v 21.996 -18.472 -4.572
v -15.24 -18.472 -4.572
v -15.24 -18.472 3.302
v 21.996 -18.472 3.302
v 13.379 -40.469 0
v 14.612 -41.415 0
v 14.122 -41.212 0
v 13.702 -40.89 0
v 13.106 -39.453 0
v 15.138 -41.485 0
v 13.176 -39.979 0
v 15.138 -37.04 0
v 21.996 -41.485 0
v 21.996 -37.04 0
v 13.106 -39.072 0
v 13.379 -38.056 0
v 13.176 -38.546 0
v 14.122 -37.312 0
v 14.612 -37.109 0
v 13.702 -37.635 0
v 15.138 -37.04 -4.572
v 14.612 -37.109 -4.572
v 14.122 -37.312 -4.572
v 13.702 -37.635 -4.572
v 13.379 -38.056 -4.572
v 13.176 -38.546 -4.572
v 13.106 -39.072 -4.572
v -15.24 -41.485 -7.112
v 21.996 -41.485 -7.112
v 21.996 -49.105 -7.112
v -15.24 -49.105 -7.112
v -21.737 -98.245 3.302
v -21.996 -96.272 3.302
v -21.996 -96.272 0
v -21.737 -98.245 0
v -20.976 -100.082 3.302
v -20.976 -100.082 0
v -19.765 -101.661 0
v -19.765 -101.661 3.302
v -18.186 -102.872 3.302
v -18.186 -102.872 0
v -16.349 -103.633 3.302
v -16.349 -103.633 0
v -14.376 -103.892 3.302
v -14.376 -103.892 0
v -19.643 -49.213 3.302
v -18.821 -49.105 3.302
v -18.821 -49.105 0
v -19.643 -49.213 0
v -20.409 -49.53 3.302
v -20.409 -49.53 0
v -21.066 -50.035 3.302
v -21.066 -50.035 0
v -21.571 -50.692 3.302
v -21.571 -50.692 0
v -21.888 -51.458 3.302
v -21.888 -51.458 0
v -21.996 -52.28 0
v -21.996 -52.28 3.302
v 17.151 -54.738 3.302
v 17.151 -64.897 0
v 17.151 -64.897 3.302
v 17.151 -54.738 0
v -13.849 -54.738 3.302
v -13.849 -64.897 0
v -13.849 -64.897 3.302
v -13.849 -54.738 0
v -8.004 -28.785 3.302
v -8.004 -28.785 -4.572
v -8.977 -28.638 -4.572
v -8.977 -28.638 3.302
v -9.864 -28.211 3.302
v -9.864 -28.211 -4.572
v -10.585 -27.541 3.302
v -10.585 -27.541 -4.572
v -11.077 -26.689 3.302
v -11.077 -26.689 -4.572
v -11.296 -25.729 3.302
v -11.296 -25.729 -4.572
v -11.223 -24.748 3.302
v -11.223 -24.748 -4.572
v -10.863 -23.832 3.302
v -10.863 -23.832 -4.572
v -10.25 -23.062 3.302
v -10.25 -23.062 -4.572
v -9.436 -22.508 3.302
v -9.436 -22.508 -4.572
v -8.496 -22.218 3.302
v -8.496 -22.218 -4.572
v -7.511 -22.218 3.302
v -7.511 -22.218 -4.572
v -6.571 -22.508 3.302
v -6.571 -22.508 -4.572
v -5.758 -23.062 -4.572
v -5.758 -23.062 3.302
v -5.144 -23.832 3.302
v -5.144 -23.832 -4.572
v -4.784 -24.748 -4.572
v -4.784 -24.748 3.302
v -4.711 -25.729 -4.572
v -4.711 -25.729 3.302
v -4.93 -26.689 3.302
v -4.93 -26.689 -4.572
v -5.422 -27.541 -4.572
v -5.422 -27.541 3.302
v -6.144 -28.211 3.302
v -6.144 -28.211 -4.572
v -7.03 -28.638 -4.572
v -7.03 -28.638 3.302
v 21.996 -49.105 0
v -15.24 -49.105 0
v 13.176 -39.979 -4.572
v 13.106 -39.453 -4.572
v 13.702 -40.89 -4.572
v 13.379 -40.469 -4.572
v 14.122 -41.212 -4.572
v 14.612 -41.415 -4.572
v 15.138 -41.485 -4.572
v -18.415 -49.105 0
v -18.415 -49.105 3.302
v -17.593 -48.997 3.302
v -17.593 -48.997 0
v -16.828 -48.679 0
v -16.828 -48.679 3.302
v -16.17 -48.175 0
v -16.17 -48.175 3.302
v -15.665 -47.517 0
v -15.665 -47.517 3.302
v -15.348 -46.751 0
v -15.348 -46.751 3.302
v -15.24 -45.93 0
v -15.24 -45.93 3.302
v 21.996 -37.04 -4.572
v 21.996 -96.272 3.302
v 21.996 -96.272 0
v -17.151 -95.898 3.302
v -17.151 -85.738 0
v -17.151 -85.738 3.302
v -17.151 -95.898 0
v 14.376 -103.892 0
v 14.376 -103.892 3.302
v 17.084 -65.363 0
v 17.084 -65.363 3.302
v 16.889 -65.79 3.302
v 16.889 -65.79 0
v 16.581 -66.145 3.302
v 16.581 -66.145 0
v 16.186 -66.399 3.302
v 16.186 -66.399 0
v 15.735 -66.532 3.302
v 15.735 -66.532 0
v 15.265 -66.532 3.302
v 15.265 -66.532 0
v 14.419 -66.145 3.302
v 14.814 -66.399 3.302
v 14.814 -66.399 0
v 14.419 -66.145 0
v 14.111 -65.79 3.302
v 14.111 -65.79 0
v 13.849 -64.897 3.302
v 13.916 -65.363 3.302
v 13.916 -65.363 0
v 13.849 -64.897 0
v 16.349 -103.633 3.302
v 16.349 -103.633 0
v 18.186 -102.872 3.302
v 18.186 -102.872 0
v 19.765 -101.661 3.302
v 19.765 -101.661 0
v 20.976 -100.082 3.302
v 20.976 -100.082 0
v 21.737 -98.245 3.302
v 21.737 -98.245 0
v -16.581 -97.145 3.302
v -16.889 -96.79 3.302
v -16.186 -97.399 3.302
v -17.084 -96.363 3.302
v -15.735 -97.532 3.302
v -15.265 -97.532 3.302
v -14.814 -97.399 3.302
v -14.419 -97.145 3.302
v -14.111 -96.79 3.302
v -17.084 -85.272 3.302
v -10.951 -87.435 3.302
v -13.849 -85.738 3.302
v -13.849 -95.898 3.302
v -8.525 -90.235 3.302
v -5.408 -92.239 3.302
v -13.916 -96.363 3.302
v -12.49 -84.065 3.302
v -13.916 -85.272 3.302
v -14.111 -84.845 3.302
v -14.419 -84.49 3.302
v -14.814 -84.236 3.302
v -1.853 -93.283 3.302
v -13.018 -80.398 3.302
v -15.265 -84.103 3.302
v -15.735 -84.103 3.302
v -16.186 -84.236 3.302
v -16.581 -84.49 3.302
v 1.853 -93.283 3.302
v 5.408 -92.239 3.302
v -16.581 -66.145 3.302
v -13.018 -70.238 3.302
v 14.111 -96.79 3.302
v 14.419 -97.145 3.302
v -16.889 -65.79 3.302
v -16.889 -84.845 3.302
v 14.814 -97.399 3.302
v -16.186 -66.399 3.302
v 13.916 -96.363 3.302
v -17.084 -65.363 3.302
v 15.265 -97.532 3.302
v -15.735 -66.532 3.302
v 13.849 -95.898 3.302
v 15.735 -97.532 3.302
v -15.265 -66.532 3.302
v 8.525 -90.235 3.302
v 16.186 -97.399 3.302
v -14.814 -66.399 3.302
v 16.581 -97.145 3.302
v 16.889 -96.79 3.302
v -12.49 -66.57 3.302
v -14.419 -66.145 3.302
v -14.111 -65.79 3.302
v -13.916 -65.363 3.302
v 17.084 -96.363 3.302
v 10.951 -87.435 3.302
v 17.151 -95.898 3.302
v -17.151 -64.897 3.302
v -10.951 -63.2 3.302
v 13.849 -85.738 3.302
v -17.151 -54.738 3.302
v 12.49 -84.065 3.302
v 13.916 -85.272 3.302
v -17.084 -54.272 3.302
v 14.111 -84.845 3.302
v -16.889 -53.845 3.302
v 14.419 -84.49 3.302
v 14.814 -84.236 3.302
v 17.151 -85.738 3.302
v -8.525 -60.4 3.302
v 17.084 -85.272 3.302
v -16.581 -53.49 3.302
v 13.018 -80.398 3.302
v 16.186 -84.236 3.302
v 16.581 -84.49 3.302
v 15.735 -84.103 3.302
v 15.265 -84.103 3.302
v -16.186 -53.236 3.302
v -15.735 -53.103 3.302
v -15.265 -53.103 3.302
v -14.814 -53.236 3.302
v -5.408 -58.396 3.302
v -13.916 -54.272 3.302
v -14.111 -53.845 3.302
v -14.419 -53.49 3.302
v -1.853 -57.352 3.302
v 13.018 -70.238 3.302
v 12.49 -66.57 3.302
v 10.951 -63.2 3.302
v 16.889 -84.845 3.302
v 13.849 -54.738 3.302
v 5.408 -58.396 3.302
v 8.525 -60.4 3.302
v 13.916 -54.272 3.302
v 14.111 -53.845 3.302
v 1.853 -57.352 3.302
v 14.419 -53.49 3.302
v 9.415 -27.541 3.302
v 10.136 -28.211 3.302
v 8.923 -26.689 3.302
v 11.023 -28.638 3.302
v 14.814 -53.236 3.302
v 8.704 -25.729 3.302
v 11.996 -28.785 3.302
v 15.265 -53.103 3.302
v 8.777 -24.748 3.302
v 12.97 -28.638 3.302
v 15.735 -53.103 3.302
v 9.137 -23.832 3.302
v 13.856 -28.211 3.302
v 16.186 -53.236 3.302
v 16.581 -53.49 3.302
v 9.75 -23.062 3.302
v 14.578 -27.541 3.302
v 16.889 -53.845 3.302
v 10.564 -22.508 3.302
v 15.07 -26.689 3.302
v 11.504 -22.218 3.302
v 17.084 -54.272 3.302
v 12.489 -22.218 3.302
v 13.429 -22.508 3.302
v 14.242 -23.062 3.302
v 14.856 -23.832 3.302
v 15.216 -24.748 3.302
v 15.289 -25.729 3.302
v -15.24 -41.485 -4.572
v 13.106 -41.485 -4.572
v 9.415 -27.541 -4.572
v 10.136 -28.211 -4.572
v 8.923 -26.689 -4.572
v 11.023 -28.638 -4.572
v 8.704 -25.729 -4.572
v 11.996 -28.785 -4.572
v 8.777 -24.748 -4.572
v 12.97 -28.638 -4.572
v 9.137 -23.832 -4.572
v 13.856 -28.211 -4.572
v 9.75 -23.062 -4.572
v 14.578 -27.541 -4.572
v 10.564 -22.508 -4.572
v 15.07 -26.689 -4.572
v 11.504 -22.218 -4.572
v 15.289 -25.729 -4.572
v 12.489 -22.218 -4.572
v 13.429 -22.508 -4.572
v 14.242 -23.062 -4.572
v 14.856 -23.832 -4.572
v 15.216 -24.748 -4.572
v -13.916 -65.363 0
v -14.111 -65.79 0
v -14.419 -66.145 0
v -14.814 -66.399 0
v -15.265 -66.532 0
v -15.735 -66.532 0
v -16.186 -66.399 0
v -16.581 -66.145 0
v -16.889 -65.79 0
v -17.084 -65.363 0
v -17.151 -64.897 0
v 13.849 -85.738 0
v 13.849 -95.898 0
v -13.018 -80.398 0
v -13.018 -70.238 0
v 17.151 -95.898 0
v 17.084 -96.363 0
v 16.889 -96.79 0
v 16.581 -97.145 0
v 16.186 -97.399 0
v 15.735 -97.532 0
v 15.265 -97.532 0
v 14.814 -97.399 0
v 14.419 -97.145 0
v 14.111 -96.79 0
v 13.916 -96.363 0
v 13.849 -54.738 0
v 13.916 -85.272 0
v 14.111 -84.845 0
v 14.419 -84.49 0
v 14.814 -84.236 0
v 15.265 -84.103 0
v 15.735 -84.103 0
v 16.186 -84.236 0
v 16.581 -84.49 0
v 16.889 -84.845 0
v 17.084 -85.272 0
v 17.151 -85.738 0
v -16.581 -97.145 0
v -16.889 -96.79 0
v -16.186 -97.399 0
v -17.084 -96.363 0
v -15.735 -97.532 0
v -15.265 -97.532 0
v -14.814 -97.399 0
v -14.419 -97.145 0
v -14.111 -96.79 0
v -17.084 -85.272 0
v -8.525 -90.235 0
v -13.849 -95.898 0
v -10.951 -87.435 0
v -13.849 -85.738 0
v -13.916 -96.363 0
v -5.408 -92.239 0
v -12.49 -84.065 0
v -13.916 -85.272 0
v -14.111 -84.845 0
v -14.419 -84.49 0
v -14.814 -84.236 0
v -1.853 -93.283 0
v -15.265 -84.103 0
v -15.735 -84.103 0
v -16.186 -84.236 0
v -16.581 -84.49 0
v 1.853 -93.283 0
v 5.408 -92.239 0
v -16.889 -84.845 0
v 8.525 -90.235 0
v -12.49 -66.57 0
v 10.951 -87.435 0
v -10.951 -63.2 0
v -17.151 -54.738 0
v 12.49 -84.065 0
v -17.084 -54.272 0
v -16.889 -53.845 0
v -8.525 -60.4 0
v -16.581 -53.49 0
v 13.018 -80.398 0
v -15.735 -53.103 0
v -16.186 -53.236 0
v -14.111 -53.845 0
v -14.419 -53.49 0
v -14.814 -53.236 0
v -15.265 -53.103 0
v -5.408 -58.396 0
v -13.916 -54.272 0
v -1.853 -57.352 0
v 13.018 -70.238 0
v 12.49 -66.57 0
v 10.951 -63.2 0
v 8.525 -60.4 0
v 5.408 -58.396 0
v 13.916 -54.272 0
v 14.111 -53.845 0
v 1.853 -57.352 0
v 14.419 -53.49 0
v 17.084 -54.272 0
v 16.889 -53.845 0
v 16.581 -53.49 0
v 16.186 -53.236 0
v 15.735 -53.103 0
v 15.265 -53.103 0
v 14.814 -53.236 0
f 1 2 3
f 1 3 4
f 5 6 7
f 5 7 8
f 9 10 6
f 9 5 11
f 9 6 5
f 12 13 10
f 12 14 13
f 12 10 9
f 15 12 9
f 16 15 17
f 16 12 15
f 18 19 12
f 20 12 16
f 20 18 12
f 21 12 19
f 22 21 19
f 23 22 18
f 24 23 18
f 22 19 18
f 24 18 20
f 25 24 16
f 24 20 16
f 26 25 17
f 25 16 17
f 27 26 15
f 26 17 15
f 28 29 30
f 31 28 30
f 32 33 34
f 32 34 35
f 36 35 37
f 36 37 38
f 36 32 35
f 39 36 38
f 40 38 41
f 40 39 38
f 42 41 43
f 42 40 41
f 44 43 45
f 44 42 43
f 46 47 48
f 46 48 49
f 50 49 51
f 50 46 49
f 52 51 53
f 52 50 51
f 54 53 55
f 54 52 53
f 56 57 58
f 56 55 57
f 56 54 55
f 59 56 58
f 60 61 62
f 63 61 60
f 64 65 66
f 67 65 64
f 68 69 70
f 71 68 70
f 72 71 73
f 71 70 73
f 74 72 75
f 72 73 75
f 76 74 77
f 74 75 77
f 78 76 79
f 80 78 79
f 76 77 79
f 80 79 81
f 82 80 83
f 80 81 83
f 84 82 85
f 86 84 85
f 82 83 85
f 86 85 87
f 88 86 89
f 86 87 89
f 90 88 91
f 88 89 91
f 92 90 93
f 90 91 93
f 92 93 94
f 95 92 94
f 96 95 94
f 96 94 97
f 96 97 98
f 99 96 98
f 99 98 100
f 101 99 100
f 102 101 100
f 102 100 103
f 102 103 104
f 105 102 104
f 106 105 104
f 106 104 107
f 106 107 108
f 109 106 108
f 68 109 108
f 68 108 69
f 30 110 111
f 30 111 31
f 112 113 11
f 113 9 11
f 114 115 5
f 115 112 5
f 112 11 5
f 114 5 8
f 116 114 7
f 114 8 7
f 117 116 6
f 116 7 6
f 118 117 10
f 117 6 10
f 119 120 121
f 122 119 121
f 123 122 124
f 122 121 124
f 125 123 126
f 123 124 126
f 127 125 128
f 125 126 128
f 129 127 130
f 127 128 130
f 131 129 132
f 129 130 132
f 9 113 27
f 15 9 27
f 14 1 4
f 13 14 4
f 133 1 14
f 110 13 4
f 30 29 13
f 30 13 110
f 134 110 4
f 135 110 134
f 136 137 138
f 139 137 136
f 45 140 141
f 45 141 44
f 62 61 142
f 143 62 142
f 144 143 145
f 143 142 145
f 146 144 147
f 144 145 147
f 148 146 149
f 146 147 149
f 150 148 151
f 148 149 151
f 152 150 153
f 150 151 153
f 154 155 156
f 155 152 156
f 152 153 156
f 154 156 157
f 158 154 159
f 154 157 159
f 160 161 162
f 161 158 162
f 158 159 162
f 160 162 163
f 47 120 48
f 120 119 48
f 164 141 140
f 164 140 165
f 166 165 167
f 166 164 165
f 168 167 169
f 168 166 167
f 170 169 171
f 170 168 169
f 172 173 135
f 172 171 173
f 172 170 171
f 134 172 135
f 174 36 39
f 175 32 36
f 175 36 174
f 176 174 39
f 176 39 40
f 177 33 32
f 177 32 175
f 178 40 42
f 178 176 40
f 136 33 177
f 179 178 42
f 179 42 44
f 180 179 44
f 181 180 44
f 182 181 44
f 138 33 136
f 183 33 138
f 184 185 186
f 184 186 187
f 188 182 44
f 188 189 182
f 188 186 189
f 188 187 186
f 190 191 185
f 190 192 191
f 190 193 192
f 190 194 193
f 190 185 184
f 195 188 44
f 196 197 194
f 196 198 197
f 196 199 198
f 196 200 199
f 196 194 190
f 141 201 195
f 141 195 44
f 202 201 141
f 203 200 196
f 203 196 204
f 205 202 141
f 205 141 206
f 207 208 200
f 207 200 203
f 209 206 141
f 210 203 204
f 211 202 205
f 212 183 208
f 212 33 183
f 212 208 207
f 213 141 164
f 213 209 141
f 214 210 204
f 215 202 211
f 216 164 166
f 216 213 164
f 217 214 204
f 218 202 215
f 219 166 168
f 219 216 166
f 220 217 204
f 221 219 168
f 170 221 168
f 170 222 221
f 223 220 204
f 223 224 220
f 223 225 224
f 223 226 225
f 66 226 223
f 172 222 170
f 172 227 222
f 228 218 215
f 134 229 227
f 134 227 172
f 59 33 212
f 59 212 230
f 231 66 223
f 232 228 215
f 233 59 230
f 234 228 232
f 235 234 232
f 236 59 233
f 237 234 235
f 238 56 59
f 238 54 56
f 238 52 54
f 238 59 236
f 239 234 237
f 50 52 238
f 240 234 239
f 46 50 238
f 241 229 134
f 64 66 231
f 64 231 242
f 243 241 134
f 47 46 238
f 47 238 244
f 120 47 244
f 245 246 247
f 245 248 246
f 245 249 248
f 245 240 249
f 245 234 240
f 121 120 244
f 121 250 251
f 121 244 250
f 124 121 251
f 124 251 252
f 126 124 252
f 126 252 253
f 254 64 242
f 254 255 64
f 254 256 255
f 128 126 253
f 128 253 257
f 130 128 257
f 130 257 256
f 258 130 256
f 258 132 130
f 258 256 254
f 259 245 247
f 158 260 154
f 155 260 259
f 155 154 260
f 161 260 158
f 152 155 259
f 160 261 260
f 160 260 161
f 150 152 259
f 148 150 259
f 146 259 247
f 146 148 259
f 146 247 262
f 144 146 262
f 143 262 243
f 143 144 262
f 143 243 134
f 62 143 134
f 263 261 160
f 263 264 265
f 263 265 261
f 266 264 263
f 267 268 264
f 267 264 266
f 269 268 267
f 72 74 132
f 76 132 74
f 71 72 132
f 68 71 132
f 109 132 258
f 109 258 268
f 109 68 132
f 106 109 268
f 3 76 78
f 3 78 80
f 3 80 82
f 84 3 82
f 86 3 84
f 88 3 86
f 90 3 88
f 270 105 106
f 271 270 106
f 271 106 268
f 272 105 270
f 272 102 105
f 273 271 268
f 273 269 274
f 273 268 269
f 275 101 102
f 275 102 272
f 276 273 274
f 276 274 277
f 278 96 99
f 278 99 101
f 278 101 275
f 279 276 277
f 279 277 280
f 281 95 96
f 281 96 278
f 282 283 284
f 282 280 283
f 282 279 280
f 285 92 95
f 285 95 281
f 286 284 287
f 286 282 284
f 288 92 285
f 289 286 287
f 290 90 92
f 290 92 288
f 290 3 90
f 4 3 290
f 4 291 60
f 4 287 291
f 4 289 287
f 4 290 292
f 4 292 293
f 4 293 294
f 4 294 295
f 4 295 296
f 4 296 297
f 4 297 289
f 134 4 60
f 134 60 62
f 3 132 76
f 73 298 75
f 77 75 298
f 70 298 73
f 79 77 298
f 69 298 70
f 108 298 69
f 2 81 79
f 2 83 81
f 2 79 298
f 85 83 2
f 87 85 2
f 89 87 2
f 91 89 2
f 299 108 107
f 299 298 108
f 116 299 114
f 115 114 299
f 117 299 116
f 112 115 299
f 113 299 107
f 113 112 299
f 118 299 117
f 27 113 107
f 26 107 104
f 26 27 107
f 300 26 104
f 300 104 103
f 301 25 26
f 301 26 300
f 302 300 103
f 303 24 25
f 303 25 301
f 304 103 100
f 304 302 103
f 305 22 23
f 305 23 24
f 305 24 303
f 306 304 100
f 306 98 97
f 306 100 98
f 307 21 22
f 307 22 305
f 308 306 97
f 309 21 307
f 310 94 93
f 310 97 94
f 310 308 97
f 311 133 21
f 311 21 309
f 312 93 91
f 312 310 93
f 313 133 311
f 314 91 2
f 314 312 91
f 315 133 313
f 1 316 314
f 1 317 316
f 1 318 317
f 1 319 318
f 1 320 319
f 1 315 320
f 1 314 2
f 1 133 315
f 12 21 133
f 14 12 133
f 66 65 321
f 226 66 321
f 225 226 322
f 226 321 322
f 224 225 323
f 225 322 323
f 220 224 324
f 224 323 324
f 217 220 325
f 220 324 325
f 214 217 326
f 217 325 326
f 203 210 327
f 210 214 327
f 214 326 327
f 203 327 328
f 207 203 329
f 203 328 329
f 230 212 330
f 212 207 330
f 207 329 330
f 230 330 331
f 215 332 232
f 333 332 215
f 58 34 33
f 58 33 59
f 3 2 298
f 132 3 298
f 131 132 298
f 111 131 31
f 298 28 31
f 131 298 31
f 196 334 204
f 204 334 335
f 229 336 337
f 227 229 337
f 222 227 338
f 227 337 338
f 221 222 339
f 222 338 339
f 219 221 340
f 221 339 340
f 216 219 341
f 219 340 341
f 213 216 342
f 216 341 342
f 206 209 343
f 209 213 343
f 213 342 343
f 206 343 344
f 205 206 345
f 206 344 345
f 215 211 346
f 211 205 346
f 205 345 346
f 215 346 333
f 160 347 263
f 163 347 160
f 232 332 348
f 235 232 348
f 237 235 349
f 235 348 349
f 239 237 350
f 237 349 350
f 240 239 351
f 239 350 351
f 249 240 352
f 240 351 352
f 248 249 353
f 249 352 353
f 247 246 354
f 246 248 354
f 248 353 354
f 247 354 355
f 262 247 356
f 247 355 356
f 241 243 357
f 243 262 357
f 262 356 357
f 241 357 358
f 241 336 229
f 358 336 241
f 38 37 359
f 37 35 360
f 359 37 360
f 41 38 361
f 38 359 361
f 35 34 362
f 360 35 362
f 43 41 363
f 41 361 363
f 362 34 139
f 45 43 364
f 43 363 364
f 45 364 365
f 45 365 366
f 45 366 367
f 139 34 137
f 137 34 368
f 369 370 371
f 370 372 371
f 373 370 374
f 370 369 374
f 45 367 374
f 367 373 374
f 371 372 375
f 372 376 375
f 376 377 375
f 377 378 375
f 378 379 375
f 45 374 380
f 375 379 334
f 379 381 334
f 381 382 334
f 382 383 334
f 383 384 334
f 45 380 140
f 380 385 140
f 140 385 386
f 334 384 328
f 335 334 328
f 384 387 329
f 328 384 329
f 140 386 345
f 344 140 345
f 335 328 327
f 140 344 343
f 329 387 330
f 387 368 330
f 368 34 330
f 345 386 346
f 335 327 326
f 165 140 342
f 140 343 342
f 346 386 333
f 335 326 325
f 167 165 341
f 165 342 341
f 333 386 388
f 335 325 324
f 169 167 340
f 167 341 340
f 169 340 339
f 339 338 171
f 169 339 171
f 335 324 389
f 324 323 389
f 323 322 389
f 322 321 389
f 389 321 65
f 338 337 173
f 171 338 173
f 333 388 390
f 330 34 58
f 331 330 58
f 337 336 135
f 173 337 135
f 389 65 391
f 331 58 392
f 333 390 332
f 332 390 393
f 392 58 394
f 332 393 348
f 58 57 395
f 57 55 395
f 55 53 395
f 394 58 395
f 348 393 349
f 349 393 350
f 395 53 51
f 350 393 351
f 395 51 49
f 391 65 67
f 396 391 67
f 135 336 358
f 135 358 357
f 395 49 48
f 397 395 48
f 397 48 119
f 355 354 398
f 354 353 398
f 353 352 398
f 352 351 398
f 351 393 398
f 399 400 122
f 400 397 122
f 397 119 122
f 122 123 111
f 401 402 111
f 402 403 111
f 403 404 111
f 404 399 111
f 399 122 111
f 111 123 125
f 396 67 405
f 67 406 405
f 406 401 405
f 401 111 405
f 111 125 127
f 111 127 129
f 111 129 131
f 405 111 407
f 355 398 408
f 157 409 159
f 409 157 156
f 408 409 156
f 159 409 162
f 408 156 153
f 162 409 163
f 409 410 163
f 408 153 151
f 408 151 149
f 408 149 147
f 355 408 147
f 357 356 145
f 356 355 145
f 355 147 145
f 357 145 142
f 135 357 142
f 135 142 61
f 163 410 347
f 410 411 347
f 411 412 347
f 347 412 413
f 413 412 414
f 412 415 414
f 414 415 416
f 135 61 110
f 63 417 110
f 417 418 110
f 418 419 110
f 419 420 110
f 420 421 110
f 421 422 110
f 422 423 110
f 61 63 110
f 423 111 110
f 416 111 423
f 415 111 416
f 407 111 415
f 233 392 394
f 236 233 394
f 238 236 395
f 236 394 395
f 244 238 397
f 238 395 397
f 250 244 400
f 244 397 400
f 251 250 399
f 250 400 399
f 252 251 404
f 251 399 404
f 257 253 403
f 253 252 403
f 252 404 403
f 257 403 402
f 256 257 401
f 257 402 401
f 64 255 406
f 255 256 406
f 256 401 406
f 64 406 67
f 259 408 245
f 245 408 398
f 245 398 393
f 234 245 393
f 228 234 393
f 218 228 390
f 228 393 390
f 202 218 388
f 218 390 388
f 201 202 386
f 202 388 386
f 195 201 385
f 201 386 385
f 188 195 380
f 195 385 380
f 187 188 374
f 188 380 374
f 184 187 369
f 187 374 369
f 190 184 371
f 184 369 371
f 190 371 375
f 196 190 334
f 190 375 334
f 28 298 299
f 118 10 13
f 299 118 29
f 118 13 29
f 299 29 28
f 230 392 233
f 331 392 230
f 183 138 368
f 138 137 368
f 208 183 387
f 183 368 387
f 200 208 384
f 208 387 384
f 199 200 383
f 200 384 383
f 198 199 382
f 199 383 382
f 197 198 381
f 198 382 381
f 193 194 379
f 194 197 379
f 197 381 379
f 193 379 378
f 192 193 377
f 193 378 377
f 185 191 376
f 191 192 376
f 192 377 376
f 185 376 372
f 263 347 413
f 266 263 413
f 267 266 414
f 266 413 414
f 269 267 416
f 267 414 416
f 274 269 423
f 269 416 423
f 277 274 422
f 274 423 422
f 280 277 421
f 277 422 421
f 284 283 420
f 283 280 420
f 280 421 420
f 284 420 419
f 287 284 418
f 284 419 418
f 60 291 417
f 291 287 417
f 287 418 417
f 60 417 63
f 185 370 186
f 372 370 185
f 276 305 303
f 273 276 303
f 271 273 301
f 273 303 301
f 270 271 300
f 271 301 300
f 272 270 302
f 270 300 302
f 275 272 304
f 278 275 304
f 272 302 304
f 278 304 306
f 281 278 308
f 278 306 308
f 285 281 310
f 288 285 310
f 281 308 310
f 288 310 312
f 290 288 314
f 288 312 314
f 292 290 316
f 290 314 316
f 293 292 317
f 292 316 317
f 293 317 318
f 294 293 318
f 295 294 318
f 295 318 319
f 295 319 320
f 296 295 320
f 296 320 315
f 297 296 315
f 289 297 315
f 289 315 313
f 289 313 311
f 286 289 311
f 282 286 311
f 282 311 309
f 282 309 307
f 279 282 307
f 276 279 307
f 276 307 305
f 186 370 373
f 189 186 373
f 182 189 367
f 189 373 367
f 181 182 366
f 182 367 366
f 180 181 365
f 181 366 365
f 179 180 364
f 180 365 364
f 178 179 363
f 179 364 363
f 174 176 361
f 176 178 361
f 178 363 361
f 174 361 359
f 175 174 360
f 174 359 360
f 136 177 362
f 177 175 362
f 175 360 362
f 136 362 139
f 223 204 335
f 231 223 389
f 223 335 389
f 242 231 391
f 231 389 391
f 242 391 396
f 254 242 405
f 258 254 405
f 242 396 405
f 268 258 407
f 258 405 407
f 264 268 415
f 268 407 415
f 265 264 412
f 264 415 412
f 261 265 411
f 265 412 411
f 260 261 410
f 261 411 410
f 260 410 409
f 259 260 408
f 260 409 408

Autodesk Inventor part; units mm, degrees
ref_plane "YZ Plane" through (0, 0, 0) normal (1, 0, 0) x (0, 1, 0)
ref_plane "XZ Plane" through (0, 0, 0) normal (0, 1, 0) x (-1, 0, 0)
sketch "Sketch1" plane through (0, 0, 0) normal (0, 0, 1) x (1, 0, 0)
  line L0 (0, 128.9005) -> (0, -151.1555) projected
  line L1 (-57.1993, 0) -> (35.1957, 0) projected
  line L2 (21.9964, -103.8925) -> (-21.9964, -103.8925)
  line L3 (-21.9964, -103.8925) -> (-21.9964, -18.4723)
  line L4 (-21.9964, -18.4723) -> (21.9964, -18.4723)
  line L5 (21.9964, -18.4723) -> (21.9964, -103.8925)
  line L6 (21.9964, -103.8925) -> (-21.9964, -18.4723) construction
  line L7 (-21.9964, -103.8925) -> (21.9964, -18.4723) construction
  line L8 (15.5, -90.8175) -> (-15.5, -90.8175) construction
  line L9 (-15.5, -90.8175) -> (-15.5, -59.8175) construction
  line L10 (-15.5, -59.8175) -> (15.5, -59.8175) construction
  line L11 (15.5, -59.8175) -> (15.5, -90.8175) construction
  line L12 (15.5, -90.8175) -> (-15.5, -59.8175) construction
  line L13 (-15.5, -90.8175) -> (15.5, -59.8175) construction
  line L14 (0, -111.1475) -> (0, -39.4875) construction
  line L15 (-15.5, -64.8975) -> (-15.5, -54.7375) construction
  line L16 (-13.849, -64.8975) -> (-13.849, -54.7375)
  line L17 (-17.151, -54.7375) -> (-17.151, -64.8975)
  arc A0 (-17.151, -64.8975) -> (-13.849, -64.8975) centre (-15.5, -64.8975) ccw
  arc A1 (-13.849, -54.7375) -> (-17.151, -54.7375) centre (-15.5, -54.7375) ccw
  arc A2 (17.151, -54.7375) -> (13.849, -54.7375) centre (15.5, -54.7375) ccw
  line L18 (17.151, -64.8975) -> (17.151, -54.7375)
  line L19 (15.5, -64.8975) -> (15.5, -54.7375) construction
  line L20 (13.849, -54.7375) -> (13.849, -64.8975)
  arc A3 (13.849, -64.8975) -> (17.151, -64.8975) centre (15.5, -64.8975) ccw
  arc A4 (-13.849, -85.7375) -> (-17.151, -85.7375) centre (-15.5, -85.7375) ccw
  line L21 (-13.849, -95.8975) -> (-13.849, -85.7375)
  line L22 (-15.5, -95.8975) -> (-15.5, -85.7375) construction
  line L23 (-17.151, -85.7375) -> (-17.151, -95.8975)
  arc A5 (-17.151, -95.8975) -> (-13.849, -95.8975) centre (-15.5, -95.8975) ccw
  arc A6 (17.151, -85.7375) -> (13.849, -85.7375) centre (15.5, -85.7375) ccw
  line L24 (17.151, -95.8975) -> (17.151, -85.7375)
  line L25 (15.5, -95.8975) -> (15.5, -85.7375) construction
  line L26 (13.849, -85.7375) -> (13.849, -95.8975)
  arc A7 (13.849, -95.8975) -> (17.151, -95.8975) centre (15.5, -95.8975) ccw
  line L27 (0, -70.2375) -> (0, -80.3975) construction
  line L28 (13.0175, -70.2375) -> (13.0175, -80.3975)
  line L29 (-13.0175, -80.3975) -> (-13.0175, -70.2375)
  arc A8 (13.0175, -70.2375) -> (-13.0175, -70.2375) centre (0, -70.2375) ccw
  arc A9 (-13.0175, -80.3975) -> (13.0175, -80.3975) centre (0, -80.3975) ccw
  point P0 (0, -75.3175)
  point P1 (-44, 88.8925)
  point P2 (15.5, -59.8175)
  point P3 (-15.5, -90.8175)
  point P4 (15.5, -90.8175)
  point P5 (0, -75.3175)
  dimension "d5" = 31
  dimension "d6" = 31
  dimension "d10" = 28.575
  dimension "d11" = 3.302
  dimension "d12" = 10.16
  dimension "d15" = 31
  dimension "d18" = 31
  dimension "d45" = 5.08
  dimension "d51" = 43.9928
  dimension "d62" = 5.08
  dimension "d63" = 85.4202
  dimension "d77" = 21.9964
extrude "Extrusion1" add sketch "Sketch1" along normal blind 3.302
extrude "Extrusion3" cut sketch "Sketch1" along normal through all contours A8 L28 A9 L0 | L0 A9 L29 A8
sketch "Sketch3" plane through (0, 0, 3.302) normal (0, 0, 1) x (1, 0, 0)
  point P0 (0, 0)
  point P1 (-44, 68.8925)
  point P2 (44, 88.8925)
  point P3 (44, 68.8925)
  point P4 (-44, 88.8925)
hole "Hole2" at (-44, 68.8925, 3.302) at (44, 88.8925, 3.302) at (44, 68.8925, 3.302) at (-44, 88.8925, 3.302) direction (0, 0, -1) diameter 7.0104 end through all clearance for "Socket Head Cap Screw" size "M6" standard "Ansi Metric M Profile"
sketch "Sketch5" plane through (0, 0, 0) normal (1, 0, 0) x (0, 1, 0)
  line L0 (-18.4723, 0) -> (-103.8925, 0) projected
  line L1 (-18.4723, 0) -> (-18.4723, 3.302) projected
  line L2 (-103.8925, 3.302) -> (-18.4723, 3.302) projected
  line L3 (-103.8925, 0) -> (-103.8925, 3.302) projected
  line L4 (-18.4723, 0) -> (-103.8925, 0) projected
  line L5 (-18.4723, 0) -> (-49.1047, 0)
  line L6 (-49.1047, 0) -> (-49.1047, -4.572)
  line L7 (-49.1047, -4.572) -> (-18.4723, -4.572)
  line L8 (-18.4723, -4.572) -> (-18.4723, 0)
  line L9 (-49.1047, -4.572) -> (-41.4847, -4.572)
  line L10 (-41.4847, -4.572) -> (-41.4847, -7.112)
  line L11 (-41.4847, -7.112) -> (-49.1047, -7.112)
  line L12 (-49.1047, -7.112) -> (-49.1047, -4.572)
  point P0 (0, 0)
  dimension "d70" = 23.0124
  dimension "d71" = 7.62
  dimension "d72" = 4.572
  dimension "d73" = 2.54
extrude "Extrusion4" add sketch "Sketch5" against normal blind 15.24 and the other way blind 21.9964 contours L8 L7 L6 L0 | L7 L10 L11 L12
fillet "Fillet2" radius 7.62 2 edges at (-21.9964, -103.8925, 1.651) (21.9964, -103.8925, 1.651)
sketch "Sketch6" plane through (0, 0, 3.302) normal (0, 0, 1) x (1, 0, 0)
  line L0 (-15.24, -41.4847) -> (21.9964, -41.4847) projected
  line L1 (21.9964, -96.2725) -> (21.9964, -18.4723) projected
  point P0 (0, 0)
  point P1 (11.9964, -25.4827)
  point P2 (-8.0036, -25.4827)
  dimension "d78" = 10
  dimension "d79" = 20
  dimension "d80" = 16.002
hole "Hole4" at (-8.0036, -25.4827, 3.302) at (11.9964, -25.4827, 3.302) direction (0, 0, -1) diameter 6.604 end through all clearance for "Socket Head Cap Screw" size "M6" standard "Ansi Metric M Profile"
sketch "Sketch7" plane through (0, 0, 0) normal (0, 0, -1) x (-1, 0, 0)
  line L0 (15.24, -41.4847) -> (15.24, -49.1047) projected
  line L1 (15.24, -49.1047) -> (-21.9964, -49.1047) projected
  line L2 (21.9964, -18.4723) -> (15.24, -18.4723) projected
  line L3 (21.9964, -96.2725) -> (21.9964, -18.4723) projected
  line L4 (15.24, -49.1047) -> (21.9964, -49.1047)
  line L5 (21.9964, -49.1047) -> (21.9964, -18.4723)
  line L6 (21.9964, -18.4723) -> (15.24, -18.4723)
  line L7 (15.24, -18.4723) -> (15.24, -49.1047)
  point P0 (0, 0)
extrude "Extrusion5" cut sketch "Sketch7" against normal up to next
fillet "Fillet3" radius 3.175 2 edges at (-15.24, -49.1047, 1.651) (-21.9964, -49.1047, 1.651)
sketch "Sketch8" plane through (21.9964, -41.4847, -4.572) normal (0, 0, -1) x (-1, 0, 0)
  circle A0 centre (30, 16.002) radius 3.302 projected
  circle A1 centre (10, 16.002) radius 3.302 projected
  line L0 (37.2364, 0) -> (0, 0) projected
  line L1 (37.2364, 23.0124) -> (37.2364, 0) projected
  line L2 (37.2364, 23.0124) -> (0, 23.0124) projected
  line L3 (0, 0) -> (0, 23.0124) projected
  line L4 (0, 0) -> (8.89, 0)
  line L5 (8.89, 0) -> (8.89, 4.445)
  line L6 (8.89, 4.445) -> (0, 4.445)
  line L7 (0, 4.445) -> (0, 0)
  point P0 (21.9964, 41.4847)
  dimension "d91" = 4.445
  dimension "d92" = 8.89
extrude "Extrusion6" cut sketch "Sketch8" against normal up to surface (4.572 mm away) contours L0 L3 L6 L5
fillet "Fillet4" radius 2.032 2 edges at (13.1064, -41.4847, -2.286) (13.1064, -37.0397, -2.286)
equation "\"d15\" = d6"
equation "\"d18\" = d6"
equation "\"d77\" = 0.5 * d51"
equation "\"d74\" = 0.5 * d51"
properties part number "J008087" material "ALUMINUM, 6061-T651"
